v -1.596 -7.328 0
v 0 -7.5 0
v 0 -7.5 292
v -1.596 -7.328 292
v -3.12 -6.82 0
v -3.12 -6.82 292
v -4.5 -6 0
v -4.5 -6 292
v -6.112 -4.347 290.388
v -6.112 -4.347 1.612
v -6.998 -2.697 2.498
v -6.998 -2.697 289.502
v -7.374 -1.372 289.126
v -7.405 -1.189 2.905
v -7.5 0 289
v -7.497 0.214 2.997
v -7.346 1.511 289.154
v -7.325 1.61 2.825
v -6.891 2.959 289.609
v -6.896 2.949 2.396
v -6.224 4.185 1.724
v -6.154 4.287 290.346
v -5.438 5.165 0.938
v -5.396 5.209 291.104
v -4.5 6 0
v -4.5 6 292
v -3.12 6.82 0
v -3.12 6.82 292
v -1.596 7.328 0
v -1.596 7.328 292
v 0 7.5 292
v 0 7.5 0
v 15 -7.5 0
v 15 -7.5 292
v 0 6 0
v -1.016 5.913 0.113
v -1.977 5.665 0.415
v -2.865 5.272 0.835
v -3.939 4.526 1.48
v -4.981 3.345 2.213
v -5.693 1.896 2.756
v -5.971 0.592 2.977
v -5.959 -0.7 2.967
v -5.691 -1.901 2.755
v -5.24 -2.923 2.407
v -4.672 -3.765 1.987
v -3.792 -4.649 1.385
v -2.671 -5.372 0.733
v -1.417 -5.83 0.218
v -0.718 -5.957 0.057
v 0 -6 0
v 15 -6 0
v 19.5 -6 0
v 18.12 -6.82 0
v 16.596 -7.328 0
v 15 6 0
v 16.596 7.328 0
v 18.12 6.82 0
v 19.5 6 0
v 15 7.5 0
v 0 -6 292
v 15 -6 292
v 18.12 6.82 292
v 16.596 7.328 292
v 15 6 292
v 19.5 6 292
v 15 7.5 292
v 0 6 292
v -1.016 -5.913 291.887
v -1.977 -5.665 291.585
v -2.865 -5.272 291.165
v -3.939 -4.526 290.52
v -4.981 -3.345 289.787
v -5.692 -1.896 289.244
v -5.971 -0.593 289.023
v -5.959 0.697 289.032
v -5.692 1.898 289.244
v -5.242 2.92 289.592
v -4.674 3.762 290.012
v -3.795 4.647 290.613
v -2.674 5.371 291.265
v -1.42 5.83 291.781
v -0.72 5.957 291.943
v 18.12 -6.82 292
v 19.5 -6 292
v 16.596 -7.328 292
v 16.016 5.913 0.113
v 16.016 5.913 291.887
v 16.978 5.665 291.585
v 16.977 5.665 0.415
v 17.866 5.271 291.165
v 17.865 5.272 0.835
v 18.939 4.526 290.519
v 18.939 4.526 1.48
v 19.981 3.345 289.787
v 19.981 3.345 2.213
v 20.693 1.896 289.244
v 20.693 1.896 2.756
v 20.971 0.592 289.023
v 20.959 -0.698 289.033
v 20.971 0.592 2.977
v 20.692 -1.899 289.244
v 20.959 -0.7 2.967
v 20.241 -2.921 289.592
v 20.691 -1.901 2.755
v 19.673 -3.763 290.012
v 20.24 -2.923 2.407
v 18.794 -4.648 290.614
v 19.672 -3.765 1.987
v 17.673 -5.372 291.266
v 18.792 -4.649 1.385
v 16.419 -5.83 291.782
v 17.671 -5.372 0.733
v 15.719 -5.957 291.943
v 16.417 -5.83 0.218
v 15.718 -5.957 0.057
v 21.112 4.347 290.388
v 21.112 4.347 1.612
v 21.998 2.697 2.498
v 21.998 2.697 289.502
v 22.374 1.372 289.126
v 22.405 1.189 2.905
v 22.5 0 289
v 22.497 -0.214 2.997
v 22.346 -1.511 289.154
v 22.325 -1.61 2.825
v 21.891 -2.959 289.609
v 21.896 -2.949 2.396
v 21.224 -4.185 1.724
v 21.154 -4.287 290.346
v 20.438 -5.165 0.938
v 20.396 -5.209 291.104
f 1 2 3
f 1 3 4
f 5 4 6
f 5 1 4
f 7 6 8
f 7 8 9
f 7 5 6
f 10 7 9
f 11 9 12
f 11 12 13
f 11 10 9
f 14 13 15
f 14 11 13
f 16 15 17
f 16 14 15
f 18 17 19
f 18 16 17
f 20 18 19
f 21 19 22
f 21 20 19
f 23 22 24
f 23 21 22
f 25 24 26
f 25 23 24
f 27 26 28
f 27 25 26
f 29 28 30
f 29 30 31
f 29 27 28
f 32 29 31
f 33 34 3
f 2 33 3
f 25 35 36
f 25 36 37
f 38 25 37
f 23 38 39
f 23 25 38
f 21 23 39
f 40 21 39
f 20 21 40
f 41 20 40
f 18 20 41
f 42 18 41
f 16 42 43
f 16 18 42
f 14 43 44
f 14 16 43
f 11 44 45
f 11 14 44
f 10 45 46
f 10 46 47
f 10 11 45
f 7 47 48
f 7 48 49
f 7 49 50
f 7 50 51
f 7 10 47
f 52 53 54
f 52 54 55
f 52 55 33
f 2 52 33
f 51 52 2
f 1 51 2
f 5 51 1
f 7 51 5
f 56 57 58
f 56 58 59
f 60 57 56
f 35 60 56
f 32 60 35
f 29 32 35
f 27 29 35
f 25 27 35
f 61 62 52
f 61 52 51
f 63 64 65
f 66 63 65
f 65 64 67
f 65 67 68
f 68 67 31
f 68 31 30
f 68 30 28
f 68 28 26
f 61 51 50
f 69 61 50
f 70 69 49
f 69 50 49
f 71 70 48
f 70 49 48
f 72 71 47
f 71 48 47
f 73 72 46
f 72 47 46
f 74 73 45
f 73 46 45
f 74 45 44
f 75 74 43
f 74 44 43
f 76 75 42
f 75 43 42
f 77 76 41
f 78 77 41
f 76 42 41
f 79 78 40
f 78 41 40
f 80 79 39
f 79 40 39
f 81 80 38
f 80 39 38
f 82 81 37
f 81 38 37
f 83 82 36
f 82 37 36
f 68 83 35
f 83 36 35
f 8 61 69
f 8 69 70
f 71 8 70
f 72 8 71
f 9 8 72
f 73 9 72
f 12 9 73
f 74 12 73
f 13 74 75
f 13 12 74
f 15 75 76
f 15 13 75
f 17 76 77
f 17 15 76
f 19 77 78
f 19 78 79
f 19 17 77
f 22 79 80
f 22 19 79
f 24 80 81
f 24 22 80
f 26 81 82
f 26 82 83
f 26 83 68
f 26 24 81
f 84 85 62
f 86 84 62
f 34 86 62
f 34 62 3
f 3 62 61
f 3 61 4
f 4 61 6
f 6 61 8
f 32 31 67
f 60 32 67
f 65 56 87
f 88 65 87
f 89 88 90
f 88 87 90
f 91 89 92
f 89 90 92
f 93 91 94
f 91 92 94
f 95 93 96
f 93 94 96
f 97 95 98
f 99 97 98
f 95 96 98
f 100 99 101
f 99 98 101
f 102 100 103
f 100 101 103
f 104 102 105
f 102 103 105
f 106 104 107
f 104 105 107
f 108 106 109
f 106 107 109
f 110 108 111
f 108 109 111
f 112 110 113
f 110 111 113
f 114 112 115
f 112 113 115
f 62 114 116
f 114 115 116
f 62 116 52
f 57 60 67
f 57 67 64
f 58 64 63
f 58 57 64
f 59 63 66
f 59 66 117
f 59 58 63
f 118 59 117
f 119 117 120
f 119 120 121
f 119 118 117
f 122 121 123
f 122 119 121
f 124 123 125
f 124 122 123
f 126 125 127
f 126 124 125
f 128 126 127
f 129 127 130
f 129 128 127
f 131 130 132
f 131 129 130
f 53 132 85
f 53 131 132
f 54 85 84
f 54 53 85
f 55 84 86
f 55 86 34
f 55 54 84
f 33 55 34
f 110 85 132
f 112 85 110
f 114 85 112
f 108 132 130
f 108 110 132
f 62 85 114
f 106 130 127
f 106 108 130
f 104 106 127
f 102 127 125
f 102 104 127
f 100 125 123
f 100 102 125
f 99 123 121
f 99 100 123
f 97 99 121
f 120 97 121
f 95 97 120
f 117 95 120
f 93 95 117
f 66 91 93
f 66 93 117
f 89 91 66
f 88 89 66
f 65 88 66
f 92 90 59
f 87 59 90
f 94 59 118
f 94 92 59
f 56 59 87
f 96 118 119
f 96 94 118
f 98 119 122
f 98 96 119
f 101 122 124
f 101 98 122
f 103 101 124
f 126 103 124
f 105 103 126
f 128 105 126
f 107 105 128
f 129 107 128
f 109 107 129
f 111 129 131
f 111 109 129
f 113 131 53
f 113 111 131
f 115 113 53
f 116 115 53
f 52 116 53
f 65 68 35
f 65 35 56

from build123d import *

# Parameters (mm, degrees)
EXTRUDE_1_DEPTH          = 292
CUT_EXTRUDE_1_DEPTH      = 293.961601579
CUT_EXTRUDE_1_DEPTH_BACK = 293.961601579
SKETCH_2_R               = 7.5


with BuildPart() as part:
    # Эскиз1 → Бобышка-Вытянуть1 (new body)
    with BuildSketch(Plane.XY):
        with BuildLine():
            Line((0, 7.5), (15, 7.5))
            ThreePointArc((15, 7.5), (22.5, 0), (15, -7.5))
            Line((15, -7.5), (0, -7.5))
            ThreePointArc((0, -7.5), (-7.5, 0), (0, 7.5))
        make_face()
        with BuildLine():
            Line((0, 6), (15, 6))
            ThreePointArc((15, 6), (21, 0), (15, -6))
            Line((15, -6), (0, -6))
            ThreePointArc((0, -6), (-6, 0), (0, 6))
        make_face(mode=Mode.SUBTRACT)
    extrude(amount=EXTRUDE_1_DEPTH)

    # Эскиз2 → Вырез-Вытянуть1 (cut, two sides: drawn at the far end of the back side and taken through both)
    with BuildSketch(Plane(origin=(0, 0, 0), x_dir=(0, 0, -1), z_dir=(1, 0, 0)).offset(-CUT_EXTRUDE_1_DEPTH_BACK)):
        with Locations((4.5, 0)):
            Circle(SKETCH_2_R)
        with Locations((-296.5, 0)):
            Circle(SKETCH_2_R)
    extrude(amount=CUT_EXTRUDE_1_DEPTH + CUT_EXTRUDE_1_DEPTH_BACK, mode=Mode.SUBTRACT)


solid = part.part
